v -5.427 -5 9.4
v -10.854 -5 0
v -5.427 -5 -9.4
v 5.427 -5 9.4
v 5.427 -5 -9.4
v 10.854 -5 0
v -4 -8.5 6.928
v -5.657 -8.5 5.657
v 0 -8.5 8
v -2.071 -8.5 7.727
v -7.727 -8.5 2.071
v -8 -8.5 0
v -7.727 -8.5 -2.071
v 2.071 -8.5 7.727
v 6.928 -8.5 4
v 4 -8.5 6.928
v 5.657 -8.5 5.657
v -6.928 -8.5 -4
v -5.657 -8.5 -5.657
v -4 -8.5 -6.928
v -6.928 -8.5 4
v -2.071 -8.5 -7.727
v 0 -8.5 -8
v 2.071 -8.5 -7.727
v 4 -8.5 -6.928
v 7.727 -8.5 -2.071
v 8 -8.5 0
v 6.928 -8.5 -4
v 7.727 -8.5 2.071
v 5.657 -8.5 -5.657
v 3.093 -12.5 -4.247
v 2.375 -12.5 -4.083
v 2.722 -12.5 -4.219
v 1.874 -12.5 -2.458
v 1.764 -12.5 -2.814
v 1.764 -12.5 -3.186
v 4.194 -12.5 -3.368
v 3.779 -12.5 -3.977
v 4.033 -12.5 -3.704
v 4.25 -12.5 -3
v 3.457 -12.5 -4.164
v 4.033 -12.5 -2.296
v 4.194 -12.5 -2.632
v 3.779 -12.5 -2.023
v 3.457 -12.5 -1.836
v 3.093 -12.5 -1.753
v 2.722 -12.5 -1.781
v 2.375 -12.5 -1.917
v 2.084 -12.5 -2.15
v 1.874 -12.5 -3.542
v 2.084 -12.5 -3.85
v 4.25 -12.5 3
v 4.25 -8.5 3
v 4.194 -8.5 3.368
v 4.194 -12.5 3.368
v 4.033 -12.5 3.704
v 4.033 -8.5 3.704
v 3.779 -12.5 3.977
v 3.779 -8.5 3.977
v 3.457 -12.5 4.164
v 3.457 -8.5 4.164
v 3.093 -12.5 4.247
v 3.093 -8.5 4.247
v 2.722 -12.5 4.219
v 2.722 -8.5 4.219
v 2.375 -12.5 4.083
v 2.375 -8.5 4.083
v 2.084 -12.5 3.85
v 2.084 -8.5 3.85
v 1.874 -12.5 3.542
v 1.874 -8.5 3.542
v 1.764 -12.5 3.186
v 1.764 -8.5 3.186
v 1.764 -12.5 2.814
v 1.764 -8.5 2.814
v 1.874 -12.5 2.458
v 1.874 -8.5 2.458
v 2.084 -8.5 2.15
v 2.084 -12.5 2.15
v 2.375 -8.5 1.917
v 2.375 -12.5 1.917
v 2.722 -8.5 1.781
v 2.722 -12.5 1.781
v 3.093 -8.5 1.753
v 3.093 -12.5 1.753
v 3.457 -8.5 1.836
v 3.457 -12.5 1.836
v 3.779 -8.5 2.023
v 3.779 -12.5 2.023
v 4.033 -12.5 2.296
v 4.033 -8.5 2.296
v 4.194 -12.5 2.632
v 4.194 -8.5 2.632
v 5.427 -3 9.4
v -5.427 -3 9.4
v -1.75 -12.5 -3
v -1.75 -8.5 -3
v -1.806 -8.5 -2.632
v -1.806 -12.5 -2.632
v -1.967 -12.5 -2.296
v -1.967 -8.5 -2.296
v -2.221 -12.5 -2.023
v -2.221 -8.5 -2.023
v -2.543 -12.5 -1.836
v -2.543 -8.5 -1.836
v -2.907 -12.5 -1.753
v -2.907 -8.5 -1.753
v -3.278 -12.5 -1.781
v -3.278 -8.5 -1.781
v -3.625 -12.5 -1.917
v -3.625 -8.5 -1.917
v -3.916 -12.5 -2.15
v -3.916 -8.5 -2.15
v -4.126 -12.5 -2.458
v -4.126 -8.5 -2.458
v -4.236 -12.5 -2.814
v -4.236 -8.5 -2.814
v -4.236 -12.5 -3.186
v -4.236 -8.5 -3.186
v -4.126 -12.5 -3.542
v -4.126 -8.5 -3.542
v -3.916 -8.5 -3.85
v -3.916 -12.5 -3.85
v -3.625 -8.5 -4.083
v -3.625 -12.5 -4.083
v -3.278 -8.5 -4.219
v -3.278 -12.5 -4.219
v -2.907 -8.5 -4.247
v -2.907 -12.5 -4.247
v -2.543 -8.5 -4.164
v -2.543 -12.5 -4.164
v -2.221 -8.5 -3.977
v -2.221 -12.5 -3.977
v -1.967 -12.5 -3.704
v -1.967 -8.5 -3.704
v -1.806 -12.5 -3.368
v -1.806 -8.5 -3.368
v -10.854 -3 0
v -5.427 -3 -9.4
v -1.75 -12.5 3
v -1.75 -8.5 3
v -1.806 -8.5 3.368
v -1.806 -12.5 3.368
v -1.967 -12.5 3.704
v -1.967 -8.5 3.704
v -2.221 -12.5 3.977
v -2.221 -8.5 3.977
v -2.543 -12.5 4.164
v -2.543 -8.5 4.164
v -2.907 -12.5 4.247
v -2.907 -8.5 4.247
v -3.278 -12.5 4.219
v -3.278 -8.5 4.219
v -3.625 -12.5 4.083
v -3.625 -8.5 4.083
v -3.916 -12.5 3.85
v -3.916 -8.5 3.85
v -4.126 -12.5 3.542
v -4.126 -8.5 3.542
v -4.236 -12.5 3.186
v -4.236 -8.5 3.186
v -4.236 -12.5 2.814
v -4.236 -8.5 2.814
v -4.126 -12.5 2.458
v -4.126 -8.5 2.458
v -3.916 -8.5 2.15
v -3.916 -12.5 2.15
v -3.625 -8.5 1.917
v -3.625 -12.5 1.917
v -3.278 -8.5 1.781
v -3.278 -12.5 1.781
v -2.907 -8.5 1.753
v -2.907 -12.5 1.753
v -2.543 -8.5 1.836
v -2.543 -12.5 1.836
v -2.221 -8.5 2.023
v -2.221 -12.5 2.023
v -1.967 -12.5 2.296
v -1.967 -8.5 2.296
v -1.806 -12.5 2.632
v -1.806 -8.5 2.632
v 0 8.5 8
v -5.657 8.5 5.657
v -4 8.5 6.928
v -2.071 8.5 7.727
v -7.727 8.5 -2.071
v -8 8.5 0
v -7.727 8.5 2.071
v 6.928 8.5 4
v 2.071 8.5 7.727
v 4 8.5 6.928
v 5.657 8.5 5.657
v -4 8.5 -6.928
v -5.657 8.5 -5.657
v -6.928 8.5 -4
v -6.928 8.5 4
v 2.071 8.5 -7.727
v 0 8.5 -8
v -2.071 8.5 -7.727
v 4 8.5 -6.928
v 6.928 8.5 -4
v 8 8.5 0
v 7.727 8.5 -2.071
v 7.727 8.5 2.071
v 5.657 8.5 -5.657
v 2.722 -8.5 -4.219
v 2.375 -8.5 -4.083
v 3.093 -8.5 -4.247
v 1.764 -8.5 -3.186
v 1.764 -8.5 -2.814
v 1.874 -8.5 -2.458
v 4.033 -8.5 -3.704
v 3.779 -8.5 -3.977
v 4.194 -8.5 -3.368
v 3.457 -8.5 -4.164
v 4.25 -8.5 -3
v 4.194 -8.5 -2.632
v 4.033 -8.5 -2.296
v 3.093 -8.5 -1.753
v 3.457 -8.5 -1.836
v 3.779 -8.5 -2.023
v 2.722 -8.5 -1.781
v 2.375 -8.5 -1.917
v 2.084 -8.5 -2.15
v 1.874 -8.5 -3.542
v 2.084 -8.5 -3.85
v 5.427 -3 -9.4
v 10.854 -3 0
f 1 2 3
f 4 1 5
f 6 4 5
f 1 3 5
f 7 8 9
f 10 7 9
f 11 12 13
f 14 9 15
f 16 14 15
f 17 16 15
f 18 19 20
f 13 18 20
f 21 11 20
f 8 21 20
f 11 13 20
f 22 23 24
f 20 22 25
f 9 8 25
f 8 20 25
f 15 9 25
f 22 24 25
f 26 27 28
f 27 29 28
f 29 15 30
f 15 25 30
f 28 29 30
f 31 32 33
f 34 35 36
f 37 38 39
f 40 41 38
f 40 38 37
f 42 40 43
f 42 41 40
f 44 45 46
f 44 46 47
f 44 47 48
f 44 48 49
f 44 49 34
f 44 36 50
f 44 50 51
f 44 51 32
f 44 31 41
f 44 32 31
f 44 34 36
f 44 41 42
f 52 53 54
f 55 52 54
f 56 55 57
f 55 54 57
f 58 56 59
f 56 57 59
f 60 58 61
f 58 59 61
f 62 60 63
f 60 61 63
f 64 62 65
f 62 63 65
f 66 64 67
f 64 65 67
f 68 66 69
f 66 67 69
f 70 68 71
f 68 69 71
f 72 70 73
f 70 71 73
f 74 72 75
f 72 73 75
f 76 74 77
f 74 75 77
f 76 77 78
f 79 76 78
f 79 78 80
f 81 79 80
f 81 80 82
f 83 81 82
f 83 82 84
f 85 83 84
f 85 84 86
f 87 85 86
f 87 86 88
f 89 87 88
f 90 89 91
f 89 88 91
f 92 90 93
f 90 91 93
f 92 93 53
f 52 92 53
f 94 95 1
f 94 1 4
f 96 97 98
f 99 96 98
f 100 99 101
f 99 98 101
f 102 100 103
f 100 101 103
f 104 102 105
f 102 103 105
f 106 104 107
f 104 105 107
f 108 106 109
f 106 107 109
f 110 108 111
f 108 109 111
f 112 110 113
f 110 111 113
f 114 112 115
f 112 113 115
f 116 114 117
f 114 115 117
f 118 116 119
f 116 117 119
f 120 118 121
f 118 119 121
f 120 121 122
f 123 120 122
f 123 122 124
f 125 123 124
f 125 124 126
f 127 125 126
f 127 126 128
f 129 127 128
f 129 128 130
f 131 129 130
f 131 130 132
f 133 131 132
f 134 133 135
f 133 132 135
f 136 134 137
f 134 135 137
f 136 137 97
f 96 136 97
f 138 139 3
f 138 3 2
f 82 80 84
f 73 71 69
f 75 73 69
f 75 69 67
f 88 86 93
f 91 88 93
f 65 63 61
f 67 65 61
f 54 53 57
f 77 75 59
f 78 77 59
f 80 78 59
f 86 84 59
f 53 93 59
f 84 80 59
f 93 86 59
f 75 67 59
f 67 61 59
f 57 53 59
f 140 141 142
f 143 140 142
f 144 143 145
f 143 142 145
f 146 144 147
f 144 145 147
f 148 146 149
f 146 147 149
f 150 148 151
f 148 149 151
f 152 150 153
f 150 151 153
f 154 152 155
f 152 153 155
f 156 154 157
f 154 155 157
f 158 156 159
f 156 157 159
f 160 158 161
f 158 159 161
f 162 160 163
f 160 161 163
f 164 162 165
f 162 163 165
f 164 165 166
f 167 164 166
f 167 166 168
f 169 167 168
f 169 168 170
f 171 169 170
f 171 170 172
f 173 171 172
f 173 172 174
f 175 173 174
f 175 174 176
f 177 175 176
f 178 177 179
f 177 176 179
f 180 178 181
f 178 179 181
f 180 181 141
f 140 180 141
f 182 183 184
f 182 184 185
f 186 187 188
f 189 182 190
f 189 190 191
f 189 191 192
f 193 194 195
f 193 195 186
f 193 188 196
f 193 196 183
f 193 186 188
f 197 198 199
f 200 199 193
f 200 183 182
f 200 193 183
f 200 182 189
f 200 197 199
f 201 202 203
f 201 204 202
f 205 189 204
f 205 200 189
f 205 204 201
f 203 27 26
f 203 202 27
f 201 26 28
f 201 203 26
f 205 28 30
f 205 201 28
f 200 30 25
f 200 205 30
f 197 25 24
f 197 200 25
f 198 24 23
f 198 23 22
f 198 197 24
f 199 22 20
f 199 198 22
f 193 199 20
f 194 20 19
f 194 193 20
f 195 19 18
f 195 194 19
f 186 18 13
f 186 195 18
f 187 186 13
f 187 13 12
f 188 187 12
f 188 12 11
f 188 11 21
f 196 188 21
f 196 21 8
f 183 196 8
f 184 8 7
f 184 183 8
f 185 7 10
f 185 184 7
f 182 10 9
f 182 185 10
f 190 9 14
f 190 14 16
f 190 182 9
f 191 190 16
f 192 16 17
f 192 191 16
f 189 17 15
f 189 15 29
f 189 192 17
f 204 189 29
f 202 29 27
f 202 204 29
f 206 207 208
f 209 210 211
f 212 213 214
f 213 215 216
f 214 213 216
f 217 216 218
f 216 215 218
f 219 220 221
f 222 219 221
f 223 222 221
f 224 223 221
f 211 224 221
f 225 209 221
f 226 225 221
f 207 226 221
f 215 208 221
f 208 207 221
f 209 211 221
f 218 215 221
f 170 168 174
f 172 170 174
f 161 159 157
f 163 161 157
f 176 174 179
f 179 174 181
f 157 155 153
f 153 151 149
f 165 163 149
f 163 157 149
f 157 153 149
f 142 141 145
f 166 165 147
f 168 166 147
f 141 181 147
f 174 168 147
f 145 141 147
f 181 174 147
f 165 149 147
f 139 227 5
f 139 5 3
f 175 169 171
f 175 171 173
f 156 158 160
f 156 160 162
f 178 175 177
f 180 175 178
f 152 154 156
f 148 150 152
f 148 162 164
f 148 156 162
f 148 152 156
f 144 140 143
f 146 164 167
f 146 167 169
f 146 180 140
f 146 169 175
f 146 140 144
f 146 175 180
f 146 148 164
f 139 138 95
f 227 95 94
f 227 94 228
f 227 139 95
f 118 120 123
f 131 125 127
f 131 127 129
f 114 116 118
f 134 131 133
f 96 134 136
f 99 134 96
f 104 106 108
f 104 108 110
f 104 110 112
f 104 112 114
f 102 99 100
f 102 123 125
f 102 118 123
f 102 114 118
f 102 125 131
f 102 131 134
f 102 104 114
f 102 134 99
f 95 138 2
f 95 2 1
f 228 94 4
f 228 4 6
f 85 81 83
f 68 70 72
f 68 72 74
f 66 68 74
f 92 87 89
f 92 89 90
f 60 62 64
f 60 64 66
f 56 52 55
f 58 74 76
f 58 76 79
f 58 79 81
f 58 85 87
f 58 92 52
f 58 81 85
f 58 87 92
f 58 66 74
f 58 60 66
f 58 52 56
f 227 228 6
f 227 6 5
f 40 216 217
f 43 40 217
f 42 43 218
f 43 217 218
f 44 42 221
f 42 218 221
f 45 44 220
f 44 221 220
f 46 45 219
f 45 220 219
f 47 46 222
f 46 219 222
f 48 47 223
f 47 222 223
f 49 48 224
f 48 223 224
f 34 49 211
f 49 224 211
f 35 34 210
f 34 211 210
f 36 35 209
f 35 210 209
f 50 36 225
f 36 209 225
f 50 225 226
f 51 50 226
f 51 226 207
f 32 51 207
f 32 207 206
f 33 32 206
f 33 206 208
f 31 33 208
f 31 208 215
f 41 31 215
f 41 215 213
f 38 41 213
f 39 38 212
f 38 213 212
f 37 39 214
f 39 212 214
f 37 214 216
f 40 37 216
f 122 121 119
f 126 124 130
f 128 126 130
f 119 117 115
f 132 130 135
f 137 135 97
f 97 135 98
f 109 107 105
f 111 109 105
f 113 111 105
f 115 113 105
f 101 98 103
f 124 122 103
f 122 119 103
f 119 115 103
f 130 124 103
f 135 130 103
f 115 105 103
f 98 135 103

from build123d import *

# Parameters (mm, degrees)
SKETCH1_R             = 8
BOSS_EXTRUDE1_DEPTH   = 8.5
SKETCH2_R             = 1.25
BOSS_EXTRUDE2_DEPTH   = 4
BOSS_EXTRUDE2_2_DEPTH = 4
BOSS_EXTRUDE2_3_DEPTH = 4
BOSS_EXTRUDE2_4_DEPTH = 4
BOSS_EXTRUDE3_START   = -3
BOSS_EXTRUDE3_DEPTH   = 2


with BuildPart() as part:
    # Sketch1 → Boss-Extrude1 (new body, symmetric)
    with BuildSketch(Plane(origin=(0, 0, 0), x_dir=(1, 0, 0), z_dir=(0, 1, 0))):
        Circle(SKETCH1_R)
    extrude(amount=BOSS_EXTRUDE1_DEPTH, both=True)


with BuildPart() as body_2:
    # Sketch2 → Boss-Extrude2 (new body)
    with BuildSketch(Plane.XZ.offset(8.5)):
        with Locations((-3, 3)):
            Circle(SKETCH2_R)
    extrude(amount=BOSS_EXTRUDE2_DEPTH)


with BuildPart() as body_3:
    # Sketch2 → Boss-Extrude2 2 (new body)
    with BuildSketch(Plane.XZ.offset(8.5)):
        with Locations((3, 3)):
            Circle(SKETCH2_R)
    extrude(amount=BOSS_EXTRUDE2_2_DEPTH)


with BuildPart() as body_4:
    # Sketch2 → Boss-Extrude2 3 (new body)
    with BuildSketch(Plane.XZ.offset(8.5)):
        with Locations((3, -3)):
            Circle(SKETCH2_R)
    extrude(amount=BOSS_EXTRUDE2_3_DEPTH)


with BuildPart() as body_5:
    # Sketch2 → Boss-Extrude2 4 (new body)
    with BuildSketch(Plane.XZ.offset(8.5)):
        with Locations((-3, -3)):
            Circle(SKETCH2_R)
    extrude(amount=BOSS_EXTRUDE2_4_DEPTH)


with BuildPart() as body_6:
    # Sketch3 → Boss-Extrude3 (new body)
    with BuildSketch(Plane(origin=(0, 0, 0), x_dir=(1, 0, 0), z_dir=(0, 1, 0)).offset(BOSS_EXTRUDE3_START)):
        Polygon((10.854185061, 0), (5.42709253, 9.4), (-5.42709253, 9.4), (-10.854185061, 0), (-5.42709253, -9.4), (5.42709253, -9.4), align=None)
    extrude(amount=-BOSS_EXTRUDE3_DEPTH)


solid = Compound([part.part, body_2.part, body_3.part, body_4.part, body_5.part, body_6.part])
